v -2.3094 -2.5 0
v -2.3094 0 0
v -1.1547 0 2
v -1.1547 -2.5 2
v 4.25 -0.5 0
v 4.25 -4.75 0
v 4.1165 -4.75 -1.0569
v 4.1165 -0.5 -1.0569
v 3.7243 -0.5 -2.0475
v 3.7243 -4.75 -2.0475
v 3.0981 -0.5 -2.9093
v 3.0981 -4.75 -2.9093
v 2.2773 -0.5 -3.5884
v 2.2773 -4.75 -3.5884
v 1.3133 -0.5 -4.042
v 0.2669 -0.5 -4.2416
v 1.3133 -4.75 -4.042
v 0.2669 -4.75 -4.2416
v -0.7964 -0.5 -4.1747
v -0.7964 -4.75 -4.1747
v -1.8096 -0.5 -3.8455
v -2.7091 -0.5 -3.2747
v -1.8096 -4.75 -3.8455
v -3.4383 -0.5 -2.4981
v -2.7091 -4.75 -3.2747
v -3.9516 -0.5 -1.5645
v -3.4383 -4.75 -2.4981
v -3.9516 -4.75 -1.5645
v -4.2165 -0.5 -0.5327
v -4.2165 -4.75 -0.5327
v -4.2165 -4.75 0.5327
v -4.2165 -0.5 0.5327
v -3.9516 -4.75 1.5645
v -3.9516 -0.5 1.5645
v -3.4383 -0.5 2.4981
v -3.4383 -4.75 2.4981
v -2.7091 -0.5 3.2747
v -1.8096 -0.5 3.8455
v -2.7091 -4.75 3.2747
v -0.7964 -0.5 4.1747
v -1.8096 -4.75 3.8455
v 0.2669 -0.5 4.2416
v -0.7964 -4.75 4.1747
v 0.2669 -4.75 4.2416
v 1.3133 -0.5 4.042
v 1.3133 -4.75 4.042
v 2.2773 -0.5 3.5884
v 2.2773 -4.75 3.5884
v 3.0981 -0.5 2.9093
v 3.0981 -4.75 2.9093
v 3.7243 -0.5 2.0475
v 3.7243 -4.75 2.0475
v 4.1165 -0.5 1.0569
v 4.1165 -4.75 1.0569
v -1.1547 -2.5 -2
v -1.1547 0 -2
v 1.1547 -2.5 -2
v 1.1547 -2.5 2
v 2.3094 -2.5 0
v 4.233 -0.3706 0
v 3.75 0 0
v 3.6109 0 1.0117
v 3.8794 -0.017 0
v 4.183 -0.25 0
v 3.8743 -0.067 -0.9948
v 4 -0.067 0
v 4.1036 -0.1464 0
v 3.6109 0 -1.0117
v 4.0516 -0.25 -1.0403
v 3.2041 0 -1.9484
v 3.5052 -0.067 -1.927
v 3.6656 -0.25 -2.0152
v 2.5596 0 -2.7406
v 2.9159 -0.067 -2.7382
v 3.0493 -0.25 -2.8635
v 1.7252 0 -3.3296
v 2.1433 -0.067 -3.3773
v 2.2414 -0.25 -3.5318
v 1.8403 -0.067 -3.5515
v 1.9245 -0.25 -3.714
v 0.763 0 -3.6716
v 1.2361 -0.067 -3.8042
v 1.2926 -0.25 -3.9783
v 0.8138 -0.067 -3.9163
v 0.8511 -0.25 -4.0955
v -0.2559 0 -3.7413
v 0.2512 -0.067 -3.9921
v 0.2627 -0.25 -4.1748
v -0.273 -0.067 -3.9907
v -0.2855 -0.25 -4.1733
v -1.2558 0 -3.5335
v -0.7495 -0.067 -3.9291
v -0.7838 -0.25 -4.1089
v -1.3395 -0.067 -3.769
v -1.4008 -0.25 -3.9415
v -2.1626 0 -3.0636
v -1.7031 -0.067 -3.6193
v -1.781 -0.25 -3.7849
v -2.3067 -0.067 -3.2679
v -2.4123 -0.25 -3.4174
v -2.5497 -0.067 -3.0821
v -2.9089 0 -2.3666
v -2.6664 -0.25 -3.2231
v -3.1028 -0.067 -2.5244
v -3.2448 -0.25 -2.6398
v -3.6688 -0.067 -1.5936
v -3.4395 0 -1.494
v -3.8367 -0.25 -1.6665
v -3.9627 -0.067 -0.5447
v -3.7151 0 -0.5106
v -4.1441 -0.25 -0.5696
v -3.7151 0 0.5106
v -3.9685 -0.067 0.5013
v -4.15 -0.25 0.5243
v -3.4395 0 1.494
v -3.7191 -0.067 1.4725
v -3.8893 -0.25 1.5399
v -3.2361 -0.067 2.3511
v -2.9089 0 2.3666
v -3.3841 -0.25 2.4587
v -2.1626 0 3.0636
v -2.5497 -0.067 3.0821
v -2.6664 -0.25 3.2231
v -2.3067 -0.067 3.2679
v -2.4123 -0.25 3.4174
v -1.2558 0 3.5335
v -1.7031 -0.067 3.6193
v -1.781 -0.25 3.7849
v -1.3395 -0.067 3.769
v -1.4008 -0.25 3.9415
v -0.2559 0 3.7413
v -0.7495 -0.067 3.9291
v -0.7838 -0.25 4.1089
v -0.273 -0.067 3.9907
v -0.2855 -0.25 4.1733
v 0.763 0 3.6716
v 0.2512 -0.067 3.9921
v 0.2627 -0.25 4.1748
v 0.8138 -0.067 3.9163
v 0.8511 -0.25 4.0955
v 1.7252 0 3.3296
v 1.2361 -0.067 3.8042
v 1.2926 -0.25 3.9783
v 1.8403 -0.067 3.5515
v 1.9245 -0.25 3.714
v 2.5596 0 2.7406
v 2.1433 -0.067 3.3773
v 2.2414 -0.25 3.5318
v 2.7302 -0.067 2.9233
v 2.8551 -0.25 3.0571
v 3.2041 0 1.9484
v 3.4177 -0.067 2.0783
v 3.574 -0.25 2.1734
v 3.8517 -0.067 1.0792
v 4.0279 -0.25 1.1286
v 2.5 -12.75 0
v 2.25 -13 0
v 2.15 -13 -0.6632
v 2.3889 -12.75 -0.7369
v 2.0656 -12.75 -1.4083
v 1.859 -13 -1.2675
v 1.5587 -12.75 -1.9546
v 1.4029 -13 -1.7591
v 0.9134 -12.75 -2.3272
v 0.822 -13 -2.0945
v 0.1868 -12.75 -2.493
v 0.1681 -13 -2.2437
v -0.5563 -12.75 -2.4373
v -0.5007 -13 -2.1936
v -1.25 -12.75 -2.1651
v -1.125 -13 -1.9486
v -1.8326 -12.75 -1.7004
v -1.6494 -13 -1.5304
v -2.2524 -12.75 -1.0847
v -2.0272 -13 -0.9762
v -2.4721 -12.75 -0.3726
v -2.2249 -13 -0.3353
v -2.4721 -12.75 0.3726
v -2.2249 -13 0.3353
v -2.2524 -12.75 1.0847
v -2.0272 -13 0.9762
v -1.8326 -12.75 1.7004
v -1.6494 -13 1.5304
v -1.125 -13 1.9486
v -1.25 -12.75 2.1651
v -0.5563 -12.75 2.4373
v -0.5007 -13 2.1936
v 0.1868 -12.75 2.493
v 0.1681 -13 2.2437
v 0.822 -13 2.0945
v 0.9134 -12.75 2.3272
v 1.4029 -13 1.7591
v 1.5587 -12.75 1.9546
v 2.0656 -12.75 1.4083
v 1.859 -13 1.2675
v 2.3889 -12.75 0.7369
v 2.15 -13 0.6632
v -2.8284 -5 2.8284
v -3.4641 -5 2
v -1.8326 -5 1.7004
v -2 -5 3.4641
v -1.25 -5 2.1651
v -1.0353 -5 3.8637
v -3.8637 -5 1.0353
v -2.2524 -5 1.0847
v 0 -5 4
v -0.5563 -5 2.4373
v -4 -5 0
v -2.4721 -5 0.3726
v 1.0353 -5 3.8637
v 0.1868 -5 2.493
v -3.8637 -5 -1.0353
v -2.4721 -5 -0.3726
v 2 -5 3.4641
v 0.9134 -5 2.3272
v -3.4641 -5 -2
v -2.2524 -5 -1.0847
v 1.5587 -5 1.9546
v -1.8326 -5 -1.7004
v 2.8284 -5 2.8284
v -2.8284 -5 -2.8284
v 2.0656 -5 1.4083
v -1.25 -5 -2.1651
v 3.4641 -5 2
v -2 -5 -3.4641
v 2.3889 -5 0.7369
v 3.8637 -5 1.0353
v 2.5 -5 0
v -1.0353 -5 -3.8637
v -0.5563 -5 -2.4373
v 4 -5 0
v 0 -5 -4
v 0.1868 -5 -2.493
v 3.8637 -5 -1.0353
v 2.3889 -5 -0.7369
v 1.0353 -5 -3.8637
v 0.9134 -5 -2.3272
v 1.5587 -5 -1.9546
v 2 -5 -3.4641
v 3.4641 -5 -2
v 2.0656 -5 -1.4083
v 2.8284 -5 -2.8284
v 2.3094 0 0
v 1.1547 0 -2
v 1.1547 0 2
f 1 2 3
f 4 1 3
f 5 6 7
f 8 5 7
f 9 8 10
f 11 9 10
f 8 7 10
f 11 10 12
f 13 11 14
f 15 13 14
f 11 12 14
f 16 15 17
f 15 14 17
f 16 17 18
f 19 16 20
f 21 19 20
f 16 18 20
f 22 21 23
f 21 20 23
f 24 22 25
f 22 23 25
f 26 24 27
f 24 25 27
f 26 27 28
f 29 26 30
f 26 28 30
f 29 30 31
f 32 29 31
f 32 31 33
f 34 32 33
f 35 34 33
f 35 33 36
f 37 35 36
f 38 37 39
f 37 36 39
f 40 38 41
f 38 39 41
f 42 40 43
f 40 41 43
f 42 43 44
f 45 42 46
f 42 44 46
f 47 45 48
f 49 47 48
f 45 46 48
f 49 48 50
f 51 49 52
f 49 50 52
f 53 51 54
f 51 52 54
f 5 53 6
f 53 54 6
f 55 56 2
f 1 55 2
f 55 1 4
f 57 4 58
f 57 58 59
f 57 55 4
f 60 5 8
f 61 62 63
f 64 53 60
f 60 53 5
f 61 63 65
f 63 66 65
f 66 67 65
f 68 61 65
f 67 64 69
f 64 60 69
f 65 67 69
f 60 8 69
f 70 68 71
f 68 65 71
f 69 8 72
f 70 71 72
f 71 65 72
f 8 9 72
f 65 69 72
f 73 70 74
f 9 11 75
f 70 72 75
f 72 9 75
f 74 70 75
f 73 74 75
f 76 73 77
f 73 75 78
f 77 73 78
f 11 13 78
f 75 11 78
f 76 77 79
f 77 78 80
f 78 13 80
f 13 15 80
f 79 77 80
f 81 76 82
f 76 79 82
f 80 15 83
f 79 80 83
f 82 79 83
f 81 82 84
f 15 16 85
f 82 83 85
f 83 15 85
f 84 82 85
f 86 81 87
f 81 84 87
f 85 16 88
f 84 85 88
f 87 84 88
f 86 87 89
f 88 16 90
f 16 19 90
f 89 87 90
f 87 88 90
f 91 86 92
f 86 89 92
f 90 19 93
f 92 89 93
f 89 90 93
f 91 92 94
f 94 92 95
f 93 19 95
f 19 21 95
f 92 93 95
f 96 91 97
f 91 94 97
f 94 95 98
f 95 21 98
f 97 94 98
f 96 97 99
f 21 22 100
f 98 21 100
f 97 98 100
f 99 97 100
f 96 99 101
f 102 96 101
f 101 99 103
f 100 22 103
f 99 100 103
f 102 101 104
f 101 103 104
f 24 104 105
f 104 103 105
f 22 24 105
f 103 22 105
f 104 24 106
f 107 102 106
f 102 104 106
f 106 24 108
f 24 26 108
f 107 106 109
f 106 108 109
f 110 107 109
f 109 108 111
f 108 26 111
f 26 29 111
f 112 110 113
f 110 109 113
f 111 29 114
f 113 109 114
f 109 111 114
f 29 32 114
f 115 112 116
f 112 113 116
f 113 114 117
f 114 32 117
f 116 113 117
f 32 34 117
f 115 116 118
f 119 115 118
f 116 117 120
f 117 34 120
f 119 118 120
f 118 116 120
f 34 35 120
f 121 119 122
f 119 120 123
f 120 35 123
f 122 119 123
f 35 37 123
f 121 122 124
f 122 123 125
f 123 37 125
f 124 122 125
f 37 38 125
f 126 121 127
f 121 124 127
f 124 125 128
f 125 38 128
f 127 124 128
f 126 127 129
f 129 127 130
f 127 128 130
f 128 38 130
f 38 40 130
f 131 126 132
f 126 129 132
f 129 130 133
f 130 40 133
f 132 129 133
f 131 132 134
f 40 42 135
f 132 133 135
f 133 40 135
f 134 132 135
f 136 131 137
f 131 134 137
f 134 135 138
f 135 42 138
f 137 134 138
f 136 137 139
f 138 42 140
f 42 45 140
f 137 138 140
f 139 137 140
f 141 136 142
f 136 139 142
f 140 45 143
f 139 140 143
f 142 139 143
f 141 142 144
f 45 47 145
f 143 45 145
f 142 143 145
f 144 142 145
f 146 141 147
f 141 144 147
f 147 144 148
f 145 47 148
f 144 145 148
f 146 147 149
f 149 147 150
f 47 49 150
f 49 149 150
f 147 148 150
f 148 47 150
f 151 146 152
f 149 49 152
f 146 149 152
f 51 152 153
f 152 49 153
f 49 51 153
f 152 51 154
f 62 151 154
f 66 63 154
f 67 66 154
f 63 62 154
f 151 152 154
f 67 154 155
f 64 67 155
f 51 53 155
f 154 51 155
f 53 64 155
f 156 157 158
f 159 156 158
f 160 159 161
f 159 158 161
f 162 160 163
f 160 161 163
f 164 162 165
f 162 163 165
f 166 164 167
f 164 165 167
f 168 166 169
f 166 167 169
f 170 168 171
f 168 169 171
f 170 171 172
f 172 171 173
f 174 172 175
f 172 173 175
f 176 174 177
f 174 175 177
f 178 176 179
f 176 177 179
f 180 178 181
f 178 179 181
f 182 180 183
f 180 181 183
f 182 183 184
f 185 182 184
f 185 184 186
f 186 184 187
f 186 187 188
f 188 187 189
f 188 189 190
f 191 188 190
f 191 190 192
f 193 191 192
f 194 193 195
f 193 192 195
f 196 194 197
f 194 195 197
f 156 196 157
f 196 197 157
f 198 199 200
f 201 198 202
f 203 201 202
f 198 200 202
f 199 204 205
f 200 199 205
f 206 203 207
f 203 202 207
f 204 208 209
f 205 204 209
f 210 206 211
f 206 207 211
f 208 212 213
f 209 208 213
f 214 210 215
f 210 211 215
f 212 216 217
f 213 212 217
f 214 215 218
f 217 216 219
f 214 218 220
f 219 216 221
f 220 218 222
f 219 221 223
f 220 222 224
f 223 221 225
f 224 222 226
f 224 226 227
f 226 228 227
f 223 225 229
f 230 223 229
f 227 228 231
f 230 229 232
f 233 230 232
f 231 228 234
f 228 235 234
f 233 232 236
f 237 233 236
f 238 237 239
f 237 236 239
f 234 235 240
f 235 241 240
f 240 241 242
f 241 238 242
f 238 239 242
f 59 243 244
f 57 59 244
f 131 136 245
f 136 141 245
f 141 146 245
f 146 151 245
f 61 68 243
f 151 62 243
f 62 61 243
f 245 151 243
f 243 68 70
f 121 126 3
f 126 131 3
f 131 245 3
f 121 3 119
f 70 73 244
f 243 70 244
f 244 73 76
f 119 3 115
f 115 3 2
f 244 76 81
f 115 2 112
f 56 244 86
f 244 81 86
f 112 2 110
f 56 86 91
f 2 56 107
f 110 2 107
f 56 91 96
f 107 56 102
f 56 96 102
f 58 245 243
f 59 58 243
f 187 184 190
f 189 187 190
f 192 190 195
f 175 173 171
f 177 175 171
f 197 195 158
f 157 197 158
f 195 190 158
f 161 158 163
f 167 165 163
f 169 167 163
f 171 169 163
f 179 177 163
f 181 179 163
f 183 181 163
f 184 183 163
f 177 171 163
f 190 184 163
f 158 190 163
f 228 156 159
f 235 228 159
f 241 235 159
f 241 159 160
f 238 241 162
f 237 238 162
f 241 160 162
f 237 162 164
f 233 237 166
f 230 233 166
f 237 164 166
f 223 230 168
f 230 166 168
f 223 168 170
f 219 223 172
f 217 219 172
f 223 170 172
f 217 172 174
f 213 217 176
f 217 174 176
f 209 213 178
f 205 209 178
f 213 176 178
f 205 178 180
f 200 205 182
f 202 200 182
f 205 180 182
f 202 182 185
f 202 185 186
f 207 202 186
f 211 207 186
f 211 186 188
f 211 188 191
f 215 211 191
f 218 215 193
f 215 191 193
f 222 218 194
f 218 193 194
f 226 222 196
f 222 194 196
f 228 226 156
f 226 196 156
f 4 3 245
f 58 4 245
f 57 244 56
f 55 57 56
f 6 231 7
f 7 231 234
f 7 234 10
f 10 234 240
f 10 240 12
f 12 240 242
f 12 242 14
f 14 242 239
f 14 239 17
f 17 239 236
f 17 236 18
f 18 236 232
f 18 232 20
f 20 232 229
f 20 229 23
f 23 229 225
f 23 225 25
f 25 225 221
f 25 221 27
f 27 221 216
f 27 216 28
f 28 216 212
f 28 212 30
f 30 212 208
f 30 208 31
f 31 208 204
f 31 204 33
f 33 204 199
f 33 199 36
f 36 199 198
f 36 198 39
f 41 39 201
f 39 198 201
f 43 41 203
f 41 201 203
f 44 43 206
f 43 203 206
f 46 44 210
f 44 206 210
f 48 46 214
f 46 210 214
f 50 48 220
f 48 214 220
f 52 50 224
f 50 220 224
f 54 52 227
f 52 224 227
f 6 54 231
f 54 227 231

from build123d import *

# Parameters (mm, degrees)
CUT_EXTRUDE1_DEPTH = 2.5
FILLET1_R          = 0.5
CHAMFER1_SIZE      = 0.25
CHAMFER2_SIZE      = 0.25


with BuildPart() as part:
    # Sketch1 → Revolve1 (revolve)
    with BuildSketch(Plane.XY):
        Polygon((0, 0), (4.25, 0), (4.25, -5), (2.5, -5), (2.5, -13), (0, -13), align=None)
    revolve(axis=Axis((0, -18, 0), (0, 1, 0)))

    # Sketch2 → Cut-Extrude1 (cut)
    with BuildSketch(Plane(origin=(0, 0, 0), x_dir=(1, 0, 0), z_dir=(0, 1, 0))):
        Polygon((2.309401077, 0), (1.154700538, 2), (-1.154700538, 2), (-2.309401077, 0), (-1.154700538, -2), (1.154700538, -2), align=None)
    extrude(amount=-CUT_EXTRUDE1_DEPTH, mode=Mode.SUBTRACT)

    # Fillet1
    fillet1_edges = [part.edges().sort_by_distance(p)[0] for p in [
        (-4.25, 0, 0),
    ]]
    fillet(fillet1_edges, radius=FILLET1_R)

    # Chamfer1
    chamfer1_edges = [part.edges().sort_by_distance(p)[0] for p in [
        (-4.25, -5, 0),
    ]]
    chamfer(chamfer1_edges, length=CHAMFER1_SIZE)

    # Chamfer2
    chamfer2_edges = [part.edges().sort_by_distance(p)[0] for p in [
        (-2.5, -13, 0),
    ]]
    chamfer(chamfer2_edges, length=CHAMFER2_SIZE)


solid = part.part
